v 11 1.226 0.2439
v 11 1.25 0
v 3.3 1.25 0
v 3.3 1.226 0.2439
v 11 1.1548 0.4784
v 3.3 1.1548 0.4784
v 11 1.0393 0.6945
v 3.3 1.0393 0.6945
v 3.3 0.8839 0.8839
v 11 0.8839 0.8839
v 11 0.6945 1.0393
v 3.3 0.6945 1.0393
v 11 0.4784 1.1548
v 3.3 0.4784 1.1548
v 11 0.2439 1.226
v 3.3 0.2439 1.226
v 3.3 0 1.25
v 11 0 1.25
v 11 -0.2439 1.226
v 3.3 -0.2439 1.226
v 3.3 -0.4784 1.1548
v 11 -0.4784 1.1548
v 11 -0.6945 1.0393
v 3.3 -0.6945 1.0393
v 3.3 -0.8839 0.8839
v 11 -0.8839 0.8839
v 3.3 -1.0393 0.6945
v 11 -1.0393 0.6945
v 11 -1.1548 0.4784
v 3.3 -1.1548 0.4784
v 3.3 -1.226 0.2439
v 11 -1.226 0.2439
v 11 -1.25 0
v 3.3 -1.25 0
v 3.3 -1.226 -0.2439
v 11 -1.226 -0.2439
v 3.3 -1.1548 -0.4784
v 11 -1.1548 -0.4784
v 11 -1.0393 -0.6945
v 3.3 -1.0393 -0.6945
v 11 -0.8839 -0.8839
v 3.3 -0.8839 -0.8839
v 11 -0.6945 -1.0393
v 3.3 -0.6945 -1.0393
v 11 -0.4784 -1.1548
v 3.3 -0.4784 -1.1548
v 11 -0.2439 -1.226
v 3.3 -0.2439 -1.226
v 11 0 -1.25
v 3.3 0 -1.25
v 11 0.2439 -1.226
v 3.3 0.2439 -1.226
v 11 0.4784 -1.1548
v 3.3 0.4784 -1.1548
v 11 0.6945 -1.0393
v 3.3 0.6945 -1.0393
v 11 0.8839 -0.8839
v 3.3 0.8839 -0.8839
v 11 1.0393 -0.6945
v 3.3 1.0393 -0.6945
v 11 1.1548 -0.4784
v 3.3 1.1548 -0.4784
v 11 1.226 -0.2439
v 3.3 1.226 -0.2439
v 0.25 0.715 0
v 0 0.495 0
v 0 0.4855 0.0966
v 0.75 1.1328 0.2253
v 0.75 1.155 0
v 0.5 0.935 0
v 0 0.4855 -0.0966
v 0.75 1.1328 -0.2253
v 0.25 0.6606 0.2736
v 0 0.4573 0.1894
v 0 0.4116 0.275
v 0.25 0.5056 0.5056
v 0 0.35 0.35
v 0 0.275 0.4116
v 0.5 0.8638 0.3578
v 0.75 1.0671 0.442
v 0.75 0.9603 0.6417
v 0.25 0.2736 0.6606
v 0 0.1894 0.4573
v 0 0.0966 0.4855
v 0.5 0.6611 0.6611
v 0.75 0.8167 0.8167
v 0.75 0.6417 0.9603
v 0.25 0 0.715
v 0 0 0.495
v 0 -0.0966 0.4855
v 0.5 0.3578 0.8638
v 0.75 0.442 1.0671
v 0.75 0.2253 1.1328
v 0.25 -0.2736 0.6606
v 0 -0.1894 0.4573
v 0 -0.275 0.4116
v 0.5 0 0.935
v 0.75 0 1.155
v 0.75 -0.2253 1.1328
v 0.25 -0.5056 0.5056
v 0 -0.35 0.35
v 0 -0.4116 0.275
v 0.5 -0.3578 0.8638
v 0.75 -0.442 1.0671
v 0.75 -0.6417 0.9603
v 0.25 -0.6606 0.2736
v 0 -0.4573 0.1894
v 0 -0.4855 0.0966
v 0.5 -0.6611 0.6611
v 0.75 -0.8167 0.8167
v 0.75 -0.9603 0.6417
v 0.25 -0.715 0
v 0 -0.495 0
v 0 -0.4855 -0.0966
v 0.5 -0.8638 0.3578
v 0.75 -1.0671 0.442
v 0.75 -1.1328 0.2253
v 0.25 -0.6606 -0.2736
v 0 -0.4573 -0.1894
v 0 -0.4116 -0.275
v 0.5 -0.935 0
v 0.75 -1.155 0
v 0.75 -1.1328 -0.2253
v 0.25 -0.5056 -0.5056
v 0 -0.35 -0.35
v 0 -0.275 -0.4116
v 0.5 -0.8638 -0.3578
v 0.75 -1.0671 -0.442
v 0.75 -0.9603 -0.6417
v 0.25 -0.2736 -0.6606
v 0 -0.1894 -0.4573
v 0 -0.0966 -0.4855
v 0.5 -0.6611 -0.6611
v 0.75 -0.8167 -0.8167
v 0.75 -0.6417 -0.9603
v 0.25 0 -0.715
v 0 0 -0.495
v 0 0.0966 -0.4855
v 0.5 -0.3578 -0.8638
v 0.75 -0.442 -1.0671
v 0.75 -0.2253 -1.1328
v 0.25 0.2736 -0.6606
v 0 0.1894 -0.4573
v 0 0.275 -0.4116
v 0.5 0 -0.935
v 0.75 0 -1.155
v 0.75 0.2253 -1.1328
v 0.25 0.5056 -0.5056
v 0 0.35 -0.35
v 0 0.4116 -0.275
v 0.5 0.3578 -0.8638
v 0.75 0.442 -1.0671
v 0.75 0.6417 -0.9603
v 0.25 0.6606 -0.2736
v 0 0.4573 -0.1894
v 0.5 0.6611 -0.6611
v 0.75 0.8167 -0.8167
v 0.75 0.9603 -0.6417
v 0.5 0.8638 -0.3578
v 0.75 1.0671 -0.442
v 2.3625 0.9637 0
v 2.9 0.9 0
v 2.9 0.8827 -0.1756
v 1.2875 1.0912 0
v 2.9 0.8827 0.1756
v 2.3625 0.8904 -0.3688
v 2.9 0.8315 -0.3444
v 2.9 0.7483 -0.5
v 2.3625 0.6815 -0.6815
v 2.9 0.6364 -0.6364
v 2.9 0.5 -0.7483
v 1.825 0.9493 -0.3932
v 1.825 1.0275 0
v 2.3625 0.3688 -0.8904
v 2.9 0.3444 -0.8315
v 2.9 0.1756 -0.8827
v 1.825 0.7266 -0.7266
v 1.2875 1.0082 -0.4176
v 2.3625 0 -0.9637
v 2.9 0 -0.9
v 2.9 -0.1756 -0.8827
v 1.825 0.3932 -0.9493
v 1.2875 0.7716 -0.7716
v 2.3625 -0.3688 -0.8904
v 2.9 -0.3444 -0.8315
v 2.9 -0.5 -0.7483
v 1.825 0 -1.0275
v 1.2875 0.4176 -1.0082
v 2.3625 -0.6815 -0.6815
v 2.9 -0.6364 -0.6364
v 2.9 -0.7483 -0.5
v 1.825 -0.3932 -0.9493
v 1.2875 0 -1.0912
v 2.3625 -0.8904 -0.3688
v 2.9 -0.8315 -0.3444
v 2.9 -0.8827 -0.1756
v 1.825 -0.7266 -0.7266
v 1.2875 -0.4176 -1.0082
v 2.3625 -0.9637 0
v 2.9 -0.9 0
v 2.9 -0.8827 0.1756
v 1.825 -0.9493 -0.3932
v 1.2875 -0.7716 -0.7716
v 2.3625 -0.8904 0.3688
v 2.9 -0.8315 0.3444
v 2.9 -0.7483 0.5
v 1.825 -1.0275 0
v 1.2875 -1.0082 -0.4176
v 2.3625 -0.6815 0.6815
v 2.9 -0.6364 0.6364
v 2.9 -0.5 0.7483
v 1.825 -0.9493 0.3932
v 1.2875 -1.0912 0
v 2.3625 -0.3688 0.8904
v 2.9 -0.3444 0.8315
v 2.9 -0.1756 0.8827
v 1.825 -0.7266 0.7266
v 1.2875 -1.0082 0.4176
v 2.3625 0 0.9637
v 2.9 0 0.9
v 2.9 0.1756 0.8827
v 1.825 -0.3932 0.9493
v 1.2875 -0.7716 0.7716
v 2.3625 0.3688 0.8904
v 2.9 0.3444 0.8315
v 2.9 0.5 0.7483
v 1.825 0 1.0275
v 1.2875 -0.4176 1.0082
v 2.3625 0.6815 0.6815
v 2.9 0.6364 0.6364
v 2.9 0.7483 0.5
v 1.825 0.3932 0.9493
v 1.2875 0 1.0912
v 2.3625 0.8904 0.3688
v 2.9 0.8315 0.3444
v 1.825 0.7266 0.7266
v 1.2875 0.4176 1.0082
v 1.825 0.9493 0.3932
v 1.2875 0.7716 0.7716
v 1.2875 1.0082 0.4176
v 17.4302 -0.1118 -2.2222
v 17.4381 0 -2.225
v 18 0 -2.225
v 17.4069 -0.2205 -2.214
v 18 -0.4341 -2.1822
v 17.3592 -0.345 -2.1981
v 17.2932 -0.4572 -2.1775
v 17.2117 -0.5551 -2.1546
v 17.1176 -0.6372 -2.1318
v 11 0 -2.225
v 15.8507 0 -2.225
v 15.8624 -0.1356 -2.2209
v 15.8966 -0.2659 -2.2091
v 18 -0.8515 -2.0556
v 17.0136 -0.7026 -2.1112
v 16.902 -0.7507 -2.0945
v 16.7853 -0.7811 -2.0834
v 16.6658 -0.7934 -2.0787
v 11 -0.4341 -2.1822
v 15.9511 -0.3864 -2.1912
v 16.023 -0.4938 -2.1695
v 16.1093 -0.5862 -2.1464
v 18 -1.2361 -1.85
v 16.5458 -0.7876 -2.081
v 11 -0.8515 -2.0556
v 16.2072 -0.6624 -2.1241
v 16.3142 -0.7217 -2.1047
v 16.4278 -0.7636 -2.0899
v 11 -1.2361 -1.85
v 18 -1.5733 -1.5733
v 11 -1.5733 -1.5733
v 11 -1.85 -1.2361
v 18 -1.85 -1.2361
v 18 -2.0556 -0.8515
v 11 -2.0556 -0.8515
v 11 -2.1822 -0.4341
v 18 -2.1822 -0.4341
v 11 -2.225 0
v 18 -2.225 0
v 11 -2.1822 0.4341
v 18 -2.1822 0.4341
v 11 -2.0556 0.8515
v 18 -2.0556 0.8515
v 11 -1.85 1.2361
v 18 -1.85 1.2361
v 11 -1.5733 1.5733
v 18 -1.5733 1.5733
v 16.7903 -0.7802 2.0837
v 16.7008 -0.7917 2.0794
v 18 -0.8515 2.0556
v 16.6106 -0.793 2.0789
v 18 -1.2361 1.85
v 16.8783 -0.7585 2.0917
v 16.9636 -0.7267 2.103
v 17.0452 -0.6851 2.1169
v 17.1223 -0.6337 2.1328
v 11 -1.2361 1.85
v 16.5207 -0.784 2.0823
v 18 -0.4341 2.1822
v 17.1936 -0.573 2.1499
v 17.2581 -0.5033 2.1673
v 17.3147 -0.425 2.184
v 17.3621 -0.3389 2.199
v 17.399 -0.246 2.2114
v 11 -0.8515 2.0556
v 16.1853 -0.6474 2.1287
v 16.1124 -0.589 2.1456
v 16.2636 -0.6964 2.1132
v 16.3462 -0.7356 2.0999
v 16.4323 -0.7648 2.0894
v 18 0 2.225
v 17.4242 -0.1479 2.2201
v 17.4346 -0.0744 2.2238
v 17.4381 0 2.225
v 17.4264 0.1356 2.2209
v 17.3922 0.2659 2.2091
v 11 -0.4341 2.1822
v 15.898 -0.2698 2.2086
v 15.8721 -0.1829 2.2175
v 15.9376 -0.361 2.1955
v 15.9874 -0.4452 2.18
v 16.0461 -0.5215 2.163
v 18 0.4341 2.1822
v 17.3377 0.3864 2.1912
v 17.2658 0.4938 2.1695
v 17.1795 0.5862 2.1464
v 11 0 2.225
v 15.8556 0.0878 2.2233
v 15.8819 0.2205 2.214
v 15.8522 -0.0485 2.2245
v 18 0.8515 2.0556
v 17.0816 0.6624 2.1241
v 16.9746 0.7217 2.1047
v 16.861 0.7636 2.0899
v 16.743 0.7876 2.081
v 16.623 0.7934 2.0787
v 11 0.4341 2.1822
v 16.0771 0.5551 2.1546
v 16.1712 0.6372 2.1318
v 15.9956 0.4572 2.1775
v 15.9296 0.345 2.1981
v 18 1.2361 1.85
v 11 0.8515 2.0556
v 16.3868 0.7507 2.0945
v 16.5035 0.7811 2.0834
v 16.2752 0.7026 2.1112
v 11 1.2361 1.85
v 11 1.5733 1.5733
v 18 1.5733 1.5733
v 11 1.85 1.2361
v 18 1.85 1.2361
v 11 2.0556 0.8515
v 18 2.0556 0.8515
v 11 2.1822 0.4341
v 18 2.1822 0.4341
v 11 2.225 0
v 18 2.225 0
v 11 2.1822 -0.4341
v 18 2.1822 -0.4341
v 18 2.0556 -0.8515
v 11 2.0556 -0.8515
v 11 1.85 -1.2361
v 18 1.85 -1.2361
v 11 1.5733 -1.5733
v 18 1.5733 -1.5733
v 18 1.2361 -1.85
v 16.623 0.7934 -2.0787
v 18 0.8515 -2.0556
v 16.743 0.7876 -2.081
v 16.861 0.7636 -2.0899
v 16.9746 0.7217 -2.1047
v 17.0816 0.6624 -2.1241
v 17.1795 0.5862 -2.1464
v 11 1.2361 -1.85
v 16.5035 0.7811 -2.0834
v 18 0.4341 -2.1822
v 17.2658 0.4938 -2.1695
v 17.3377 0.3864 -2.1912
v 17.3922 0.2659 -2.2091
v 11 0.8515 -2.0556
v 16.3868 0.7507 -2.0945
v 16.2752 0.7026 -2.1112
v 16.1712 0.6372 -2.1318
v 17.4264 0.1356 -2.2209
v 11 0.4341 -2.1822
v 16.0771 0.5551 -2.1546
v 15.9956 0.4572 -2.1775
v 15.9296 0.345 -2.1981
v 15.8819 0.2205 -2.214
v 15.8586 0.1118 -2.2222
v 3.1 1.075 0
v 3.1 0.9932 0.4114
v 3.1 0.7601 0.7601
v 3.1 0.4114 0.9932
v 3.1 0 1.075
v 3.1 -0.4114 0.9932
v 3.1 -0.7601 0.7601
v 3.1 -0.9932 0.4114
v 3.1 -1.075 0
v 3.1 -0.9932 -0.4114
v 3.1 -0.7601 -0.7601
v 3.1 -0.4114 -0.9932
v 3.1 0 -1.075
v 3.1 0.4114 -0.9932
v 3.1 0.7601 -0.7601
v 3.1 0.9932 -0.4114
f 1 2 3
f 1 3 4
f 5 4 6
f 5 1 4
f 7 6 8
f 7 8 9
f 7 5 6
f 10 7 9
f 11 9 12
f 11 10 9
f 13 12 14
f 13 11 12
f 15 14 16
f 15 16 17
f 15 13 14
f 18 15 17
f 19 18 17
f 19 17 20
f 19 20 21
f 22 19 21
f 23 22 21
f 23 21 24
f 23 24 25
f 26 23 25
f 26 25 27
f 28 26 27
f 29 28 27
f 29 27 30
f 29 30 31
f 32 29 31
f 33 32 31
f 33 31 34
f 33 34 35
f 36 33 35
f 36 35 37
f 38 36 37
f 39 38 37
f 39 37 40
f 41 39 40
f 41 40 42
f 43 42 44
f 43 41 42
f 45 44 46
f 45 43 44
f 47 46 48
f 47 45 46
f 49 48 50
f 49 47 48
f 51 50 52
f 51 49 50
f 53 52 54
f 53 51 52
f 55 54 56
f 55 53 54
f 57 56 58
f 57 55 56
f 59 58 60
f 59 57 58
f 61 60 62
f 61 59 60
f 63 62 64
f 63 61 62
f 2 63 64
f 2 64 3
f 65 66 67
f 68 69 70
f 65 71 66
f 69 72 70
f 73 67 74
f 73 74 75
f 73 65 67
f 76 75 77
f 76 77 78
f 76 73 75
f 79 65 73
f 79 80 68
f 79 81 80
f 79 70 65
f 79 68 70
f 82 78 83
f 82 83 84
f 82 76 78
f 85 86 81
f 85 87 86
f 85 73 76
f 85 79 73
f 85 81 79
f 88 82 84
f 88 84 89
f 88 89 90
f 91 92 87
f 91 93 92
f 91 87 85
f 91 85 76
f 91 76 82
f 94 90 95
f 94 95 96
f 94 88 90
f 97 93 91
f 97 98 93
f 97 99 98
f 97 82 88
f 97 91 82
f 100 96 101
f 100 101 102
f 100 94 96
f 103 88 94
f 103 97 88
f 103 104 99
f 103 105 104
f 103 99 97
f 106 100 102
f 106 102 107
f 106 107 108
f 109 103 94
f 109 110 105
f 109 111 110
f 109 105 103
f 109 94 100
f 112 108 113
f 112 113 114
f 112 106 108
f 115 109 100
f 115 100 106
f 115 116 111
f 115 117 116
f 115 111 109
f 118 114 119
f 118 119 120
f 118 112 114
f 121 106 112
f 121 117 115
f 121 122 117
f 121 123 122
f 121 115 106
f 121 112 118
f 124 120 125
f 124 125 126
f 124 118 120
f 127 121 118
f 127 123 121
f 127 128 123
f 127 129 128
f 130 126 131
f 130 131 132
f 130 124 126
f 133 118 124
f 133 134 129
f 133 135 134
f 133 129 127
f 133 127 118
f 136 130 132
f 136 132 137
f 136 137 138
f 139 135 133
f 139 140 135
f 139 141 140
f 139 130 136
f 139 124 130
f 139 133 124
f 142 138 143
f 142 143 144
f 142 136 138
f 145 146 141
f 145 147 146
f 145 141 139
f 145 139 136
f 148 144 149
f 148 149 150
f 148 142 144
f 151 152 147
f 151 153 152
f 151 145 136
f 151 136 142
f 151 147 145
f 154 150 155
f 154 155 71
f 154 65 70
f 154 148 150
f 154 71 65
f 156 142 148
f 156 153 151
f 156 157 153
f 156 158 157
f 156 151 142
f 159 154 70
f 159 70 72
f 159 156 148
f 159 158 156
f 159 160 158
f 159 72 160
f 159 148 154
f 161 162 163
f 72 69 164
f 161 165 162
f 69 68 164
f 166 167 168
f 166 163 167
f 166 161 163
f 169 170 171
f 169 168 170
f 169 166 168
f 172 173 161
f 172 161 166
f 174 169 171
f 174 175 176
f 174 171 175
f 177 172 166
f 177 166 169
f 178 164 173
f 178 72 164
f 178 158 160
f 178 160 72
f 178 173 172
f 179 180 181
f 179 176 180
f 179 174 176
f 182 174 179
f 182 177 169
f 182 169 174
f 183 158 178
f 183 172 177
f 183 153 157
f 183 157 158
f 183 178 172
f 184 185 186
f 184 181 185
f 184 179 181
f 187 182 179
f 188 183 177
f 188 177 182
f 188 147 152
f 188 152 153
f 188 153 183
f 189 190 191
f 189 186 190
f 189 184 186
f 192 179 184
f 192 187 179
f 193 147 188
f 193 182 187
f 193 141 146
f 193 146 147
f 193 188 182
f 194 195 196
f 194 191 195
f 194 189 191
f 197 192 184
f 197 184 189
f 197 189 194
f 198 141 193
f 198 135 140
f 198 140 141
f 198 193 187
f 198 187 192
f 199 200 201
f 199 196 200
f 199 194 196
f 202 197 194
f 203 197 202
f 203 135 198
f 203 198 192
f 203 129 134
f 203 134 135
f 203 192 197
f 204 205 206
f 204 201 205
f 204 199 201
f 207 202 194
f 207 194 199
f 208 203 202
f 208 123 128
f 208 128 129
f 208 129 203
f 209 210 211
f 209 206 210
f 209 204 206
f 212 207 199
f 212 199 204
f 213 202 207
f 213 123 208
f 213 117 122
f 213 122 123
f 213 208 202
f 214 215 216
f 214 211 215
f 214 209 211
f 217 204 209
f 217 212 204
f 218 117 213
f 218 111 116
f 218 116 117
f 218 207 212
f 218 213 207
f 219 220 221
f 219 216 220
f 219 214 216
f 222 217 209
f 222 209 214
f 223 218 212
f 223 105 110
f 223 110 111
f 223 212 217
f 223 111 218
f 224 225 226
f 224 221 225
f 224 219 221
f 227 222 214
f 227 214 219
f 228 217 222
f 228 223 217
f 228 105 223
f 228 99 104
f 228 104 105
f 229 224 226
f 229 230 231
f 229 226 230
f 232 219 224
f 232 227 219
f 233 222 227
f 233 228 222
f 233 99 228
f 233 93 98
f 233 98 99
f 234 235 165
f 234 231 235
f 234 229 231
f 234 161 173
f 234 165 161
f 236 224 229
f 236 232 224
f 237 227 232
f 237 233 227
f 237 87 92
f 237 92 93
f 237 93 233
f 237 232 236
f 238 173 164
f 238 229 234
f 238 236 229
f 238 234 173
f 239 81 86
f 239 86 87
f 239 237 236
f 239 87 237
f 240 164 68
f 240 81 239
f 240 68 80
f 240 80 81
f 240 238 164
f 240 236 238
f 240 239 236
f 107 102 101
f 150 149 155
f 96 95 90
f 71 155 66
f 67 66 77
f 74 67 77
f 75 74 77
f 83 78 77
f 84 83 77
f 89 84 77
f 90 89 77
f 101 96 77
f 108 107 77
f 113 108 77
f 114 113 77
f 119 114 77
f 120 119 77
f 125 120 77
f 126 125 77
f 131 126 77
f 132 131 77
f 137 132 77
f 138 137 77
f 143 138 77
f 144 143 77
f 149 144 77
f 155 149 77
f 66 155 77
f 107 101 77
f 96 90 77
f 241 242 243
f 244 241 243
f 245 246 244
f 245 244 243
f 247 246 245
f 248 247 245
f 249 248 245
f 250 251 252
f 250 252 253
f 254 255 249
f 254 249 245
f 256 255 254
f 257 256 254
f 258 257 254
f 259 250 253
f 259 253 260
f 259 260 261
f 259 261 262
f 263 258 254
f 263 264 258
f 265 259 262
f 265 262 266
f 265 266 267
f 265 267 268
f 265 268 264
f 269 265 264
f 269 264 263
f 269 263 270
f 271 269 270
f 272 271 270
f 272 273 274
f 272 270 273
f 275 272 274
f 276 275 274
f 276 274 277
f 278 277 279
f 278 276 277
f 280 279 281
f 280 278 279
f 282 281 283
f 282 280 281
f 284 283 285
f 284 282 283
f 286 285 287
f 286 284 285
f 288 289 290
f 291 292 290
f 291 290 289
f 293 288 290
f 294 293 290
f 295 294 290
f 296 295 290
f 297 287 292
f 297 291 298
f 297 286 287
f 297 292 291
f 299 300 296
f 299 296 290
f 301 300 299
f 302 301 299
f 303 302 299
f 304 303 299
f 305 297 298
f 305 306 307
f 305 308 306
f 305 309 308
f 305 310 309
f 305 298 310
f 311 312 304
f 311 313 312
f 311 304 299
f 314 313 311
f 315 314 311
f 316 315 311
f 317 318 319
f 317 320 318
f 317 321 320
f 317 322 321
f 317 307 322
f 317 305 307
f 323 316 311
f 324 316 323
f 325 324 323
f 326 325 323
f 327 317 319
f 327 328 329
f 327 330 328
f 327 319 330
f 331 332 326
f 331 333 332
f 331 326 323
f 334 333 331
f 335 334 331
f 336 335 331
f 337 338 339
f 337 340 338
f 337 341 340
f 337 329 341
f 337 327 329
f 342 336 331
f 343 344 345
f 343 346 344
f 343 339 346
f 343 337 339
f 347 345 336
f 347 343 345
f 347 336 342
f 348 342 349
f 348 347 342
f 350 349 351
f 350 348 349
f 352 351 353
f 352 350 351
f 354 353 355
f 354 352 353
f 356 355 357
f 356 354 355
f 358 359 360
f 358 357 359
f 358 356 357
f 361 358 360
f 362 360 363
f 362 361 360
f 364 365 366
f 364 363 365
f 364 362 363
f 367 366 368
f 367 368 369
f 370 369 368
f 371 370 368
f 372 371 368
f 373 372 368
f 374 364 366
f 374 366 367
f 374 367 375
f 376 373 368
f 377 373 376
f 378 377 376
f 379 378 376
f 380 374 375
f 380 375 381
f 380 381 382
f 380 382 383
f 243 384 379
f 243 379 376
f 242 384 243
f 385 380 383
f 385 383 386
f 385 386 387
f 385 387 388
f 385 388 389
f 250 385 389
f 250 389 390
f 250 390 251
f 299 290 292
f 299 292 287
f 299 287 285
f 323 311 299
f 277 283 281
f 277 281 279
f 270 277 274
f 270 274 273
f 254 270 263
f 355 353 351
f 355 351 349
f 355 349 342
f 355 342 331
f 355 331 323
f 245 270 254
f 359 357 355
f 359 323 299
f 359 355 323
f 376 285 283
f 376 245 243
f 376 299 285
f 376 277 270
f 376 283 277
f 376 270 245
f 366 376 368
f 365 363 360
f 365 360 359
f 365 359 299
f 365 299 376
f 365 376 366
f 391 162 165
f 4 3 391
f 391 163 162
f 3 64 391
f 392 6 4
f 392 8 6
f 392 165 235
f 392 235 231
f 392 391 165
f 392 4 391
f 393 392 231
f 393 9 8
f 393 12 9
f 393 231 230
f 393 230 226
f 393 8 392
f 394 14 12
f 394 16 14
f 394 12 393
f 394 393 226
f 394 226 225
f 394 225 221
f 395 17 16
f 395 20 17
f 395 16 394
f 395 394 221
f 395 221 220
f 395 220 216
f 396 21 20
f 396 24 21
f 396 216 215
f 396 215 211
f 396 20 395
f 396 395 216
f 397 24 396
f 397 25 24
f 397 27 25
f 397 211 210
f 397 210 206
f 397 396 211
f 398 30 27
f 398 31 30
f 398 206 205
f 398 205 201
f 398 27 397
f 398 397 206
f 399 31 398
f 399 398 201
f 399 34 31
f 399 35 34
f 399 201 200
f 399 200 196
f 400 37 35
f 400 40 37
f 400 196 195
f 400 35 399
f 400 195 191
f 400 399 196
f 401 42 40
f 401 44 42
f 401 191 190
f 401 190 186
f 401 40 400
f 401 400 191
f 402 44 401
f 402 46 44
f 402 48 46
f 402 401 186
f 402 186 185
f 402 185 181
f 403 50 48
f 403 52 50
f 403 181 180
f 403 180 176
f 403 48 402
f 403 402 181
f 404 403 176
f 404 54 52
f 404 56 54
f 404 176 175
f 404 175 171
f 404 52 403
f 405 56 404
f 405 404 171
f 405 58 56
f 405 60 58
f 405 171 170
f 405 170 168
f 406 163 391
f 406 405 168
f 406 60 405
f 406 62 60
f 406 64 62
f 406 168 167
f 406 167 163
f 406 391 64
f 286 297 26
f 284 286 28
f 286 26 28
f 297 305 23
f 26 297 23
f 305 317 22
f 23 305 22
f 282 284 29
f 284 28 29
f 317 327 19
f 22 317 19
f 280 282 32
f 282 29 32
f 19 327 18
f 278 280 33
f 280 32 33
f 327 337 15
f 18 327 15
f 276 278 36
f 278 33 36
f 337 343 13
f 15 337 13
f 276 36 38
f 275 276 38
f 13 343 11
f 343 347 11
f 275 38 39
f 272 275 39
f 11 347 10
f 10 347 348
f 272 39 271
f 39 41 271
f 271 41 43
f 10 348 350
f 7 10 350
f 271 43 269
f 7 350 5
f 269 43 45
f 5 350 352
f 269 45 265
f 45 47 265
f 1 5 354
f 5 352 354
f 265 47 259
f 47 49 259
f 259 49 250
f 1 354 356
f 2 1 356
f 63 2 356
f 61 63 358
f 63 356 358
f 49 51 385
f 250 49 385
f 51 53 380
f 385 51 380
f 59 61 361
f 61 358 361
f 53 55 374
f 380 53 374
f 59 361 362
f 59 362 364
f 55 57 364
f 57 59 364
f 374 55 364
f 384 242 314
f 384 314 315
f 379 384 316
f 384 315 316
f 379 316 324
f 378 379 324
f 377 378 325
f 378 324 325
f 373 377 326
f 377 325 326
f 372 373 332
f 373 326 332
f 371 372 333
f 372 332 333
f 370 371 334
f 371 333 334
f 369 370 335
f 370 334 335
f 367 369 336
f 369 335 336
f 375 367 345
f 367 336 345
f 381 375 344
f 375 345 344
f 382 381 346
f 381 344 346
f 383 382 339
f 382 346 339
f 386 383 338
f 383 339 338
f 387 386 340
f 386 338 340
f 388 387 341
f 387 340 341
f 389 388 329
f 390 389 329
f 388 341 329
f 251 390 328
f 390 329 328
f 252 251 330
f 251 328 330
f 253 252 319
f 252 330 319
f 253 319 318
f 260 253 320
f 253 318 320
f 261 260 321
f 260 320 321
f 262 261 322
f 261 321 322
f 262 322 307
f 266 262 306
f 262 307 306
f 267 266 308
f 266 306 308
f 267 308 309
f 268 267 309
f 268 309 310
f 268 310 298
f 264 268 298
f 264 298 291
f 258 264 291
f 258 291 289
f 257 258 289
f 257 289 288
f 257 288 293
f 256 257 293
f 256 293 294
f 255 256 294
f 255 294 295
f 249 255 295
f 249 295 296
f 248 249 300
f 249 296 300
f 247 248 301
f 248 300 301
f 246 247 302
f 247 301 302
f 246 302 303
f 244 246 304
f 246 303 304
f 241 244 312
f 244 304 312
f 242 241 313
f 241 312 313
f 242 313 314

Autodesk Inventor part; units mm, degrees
ref_plane "YZ Plane" through (0, 0, 0) normal (1, 0, 0) x (0, 1, 0)
ref_plane "XZ Plane" through (0, 0, 0) normal (0, 1, 0) x (-1, 0, 0)
ref_plane "XY Plane" through (0, 0, 0) normal (0, 0, 1) x (1, 0, 0)
sketch "Sketch1" plane through (0, 0, 0) normal (0, 0, 1) x (1, 0, 0)
  line L0 (0, 0) -> (25.9627, 0)
  line L1 (0, 0) -> (0, 0.495)
  line L2 (0, 0.495) -> (0.75, 1.155)
  line L3 (0.75, 1.155) -> (2.9, 0.9)
  line L4 (2.9, 0.9) -> (3.3, 1.25)
  line L5 (3.3, 1.25) -> (11, 1.25)
  line L6 (11, 1.25) -> (11, 0)
  line L7 (11, 0) -> (0, 0)
  dimension "d0" = 0.99
  dimension "d1" = 2.5
  dimension "d2" = 2.31
  dimension "d3" = 0.75
  dimension "d4" = 1.8
  dimension "d5" = 2.9
  dimension "d6" = 3.3
  dimension "d7" = 11
revolve "Revolution1" add sketch "Sketch1" angle 360 about axis through (0, 0, 0) along (1, 0, 0)
sketch "Sketch2" plane through (11, 0, 0) normal (1, 0, 0) x (0, 0, -1)
  circle A0 centre (0, 0) radius 1.25 projected
  circle A1 centre (0, 0) radius 2.225
  dimension "d9" = 4.45
extrude "Extrusion1" add sketch "Sketch2" along normal blind 7 contours A0 | A1
sketch "Sketch3" plane through (0, 0, 0) normal (0, 0, 1) x (1, 0, 0)
  circle A0 centre (16.6444, 0) radius 0.7937
  line L0 (18, 2.225) -> (18, -2.225) projected
  point P0 (0, 0)
  dimension "d12" = 1.5875
  dimension "d13" = 1.3556
extrude "Extrusion2" cut sketch "Sketch3" along normal through all both and the other way through all
properties part number "safe_rbf"
